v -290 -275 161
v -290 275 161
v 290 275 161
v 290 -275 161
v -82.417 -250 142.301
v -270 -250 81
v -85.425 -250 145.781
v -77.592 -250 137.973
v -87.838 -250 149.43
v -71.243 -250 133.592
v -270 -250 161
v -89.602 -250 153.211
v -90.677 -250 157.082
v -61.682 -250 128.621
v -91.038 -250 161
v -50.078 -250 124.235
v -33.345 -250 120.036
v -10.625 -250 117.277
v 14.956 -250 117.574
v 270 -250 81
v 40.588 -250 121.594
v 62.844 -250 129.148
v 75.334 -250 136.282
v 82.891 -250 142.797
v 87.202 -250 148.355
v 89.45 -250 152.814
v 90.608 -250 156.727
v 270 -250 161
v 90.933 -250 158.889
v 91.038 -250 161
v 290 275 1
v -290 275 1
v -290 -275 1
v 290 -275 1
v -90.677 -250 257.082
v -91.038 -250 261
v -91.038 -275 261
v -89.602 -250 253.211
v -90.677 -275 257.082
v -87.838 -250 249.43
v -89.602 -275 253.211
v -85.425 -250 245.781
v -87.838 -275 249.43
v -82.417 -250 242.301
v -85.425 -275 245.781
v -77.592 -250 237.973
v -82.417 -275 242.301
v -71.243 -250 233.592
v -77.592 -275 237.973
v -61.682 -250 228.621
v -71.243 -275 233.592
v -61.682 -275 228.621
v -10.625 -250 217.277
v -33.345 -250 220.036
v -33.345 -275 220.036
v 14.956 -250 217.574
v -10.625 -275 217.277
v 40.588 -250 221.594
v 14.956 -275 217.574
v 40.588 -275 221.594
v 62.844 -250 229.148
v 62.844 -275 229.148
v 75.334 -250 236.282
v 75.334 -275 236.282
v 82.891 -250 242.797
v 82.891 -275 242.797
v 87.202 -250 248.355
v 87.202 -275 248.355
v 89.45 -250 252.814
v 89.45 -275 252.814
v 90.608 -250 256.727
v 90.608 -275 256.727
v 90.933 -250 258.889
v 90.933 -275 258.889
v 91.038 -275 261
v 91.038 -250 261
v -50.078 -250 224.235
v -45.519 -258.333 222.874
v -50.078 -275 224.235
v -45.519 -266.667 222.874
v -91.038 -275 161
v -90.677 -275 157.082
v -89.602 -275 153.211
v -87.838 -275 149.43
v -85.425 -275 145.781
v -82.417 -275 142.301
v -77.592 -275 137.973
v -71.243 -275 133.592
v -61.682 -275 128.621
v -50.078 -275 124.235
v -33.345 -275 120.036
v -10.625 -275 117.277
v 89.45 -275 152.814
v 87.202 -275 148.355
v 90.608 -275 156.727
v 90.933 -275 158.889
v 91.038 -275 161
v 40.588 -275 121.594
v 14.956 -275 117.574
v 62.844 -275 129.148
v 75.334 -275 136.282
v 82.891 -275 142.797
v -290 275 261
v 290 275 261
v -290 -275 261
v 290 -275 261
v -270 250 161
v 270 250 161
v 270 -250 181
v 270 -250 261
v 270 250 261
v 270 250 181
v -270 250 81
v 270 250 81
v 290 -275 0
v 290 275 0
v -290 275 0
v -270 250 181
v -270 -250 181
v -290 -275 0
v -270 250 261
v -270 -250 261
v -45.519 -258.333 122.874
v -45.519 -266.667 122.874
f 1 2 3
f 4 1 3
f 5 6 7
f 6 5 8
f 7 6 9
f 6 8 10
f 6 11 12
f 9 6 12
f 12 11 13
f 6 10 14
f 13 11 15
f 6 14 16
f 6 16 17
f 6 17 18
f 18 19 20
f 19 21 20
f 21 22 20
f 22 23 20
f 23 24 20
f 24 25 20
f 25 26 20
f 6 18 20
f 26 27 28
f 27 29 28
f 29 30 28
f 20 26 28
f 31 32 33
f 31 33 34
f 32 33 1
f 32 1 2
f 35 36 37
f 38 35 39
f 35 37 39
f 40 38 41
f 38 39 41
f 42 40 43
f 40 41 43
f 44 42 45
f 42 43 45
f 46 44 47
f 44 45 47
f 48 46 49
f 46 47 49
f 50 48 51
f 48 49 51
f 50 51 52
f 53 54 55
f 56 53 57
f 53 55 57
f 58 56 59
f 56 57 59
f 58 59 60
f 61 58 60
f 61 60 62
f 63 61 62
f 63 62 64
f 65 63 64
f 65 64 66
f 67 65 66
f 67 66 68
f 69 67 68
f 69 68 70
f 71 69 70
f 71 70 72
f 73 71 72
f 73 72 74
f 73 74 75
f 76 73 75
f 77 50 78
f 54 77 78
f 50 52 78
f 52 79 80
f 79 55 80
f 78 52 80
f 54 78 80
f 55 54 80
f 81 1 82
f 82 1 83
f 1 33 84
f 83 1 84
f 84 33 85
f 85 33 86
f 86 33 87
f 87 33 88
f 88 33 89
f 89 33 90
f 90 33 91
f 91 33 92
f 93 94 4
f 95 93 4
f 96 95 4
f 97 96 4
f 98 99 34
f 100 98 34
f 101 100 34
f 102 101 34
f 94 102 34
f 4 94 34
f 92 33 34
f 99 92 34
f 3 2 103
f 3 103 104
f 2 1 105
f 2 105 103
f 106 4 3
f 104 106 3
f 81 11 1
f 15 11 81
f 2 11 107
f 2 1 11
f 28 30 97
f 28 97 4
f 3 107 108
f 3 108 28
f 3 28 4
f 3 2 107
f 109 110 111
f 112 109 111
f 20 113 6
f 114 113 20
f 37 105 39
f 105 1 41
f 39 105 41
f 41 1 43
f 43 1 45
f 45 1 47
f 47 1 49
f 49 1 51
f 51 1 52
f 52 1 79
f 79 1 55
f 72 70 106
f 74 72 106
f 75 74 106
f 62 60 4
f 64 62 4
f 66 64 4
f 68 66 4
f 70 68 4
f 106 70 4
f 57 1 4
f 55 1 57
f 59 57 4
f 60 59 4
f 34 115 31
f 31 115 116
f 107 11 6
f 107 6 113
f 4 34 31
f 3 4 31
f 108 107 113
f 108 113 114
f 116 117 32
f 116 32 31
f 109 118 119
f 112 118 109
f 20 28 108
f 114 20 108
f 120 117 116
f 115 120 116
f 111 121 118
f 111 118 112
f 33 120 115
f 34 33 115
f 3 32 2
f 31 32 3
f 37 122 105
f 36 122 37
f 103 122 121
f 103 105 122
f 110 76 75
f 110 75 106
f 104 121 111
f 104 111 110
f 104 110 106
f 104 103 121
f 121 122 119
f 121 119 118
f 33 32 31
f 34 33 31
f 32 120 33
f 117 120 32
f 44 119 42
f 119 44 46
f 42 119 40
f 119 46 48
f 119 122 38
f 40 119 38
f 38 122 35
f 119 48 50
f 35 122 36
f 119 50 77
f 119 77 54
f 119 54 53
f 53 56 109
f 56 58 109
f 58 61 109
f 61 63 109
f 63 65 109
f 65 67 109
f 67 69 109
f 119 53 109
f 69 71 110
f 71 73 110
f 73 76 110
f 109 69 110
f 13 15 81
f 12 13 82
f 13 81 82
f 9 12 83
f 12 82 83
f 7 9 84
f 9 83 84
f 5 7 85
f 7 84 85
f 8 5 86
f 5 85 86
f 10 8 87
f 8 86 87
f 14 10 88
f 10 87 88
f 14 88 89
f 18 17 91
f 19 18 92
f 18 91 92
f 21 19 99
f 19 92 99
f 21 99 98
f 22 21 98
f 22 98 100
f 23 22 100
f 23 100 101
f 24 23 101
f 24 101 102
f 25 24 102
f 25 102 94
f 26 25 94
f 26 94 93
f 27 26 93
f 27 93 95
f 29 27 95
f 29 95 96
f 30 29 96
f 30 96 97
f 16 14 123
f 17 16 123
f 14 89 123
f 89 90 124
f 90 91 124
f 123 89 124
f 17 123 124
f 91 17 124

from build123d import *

# Parameters (mm, degrees)
F0_W      = 580
F0_H      = 550
F1_DEPTH  = 1
F2_W      = 580
F2_H      = 550
F3_DEPTH  = 160
F5_DEPTH  = 25
F6_W      = 540
F6_H      = 500
F7_DEPTH  = 80
F8_W      = 580
F8_H      = 550
F9_DEPTH  = 100
F11_DEPTH = 25
F12_W     = 540
F12_H     = 500
F13_DEPTH = 80


with BuildPart() as f1:
    # F0 (on Top) → F1 (new body)
    with BuildSketch(Plane.XY):
        Rectangle(F0_W, F0_H)
    extrude(amount=F1_DEPTH)


with BuildPart() as f3:
    # F2 (on face) → F3 (new body)
    with BuildSketch(Plane.XY.offset(1)):
        Rectangle(F2_W, F2_H)
    extrude(amount=F3_DEPTH)

    # F4 (on face) → F5 (cut)
    with BuildSketch(Plane.XZ.offset(275)):
        with BuildLine():
            add(Edge.make_bspline(
                [(91.037959, 161), (91.037959, 237.25139), (-45.518979, 199.125695), (-182.075918, 161), (-45.518979, 122.874305), (91.037959, 84.74861), (91.037959, 161)],
                knots=[0, 0, 0, 2.094395, 2.094395, 4.18879, 4.18879, 6.283185, 6.283185, 6.283185], degree=2, weights=[1, 0.5, 1, 0.5, 1, 0.5, 1]))
        make_face()
    extrude(amount=-F5_DEPTH, mode=Mode.SUBTRACT)

    # F6 (on face) → F7 (cut)
    with BuildSketch(Plane.XY.offset(161)):
        Rectangle(F6_W, F6_H)
    extrude(amount=-F7_DEPTH, mode=Mode.SUBTRACT)


with BuildPart() as f9:
    # F8 (on face) → F9 (new body)
    with BuildSketch(Plane.XY.offset(161)):
        Rectangle(F8_W, F8_H)
    extrude(amount=F9_DEPTH)

    # F10 (on face) → F11 (cut)
    with BuildSketch(Plane.XZ.offset(275)):
        with BuildLine():
            add(Edge.make_bspline(
                [(91.037959, 261), (91.037959, 337.25139), (-45.518979, 299.125695), (-182.075918, 261), (-45.518979, 222.874305), (91.037959, 184.74861), (91.037959, 261)],
                knots=[0, 0, 0, 2.094395, 2.094395, 4.18879, 4.18879, 6.283185, 6.283185, 6.283185], degree=2, weights=[1, 0.5, 1, 0.5, 1, 0.5, 1]))
        make_face()
    extrude(amount=-F11_DEPTH, mode=Mode.SUBTRACT)

    # F12 (on face) → F13 (cut)
    with BuildSketch(Plane.XY.offset(261)):
        Rectangle(F12_W, F12_H)
    extrude(amount=-F13_DEPTH, mode=Mode.SUBTRACT)


solid = Compound([f1.part, f3.part, f9.part])
